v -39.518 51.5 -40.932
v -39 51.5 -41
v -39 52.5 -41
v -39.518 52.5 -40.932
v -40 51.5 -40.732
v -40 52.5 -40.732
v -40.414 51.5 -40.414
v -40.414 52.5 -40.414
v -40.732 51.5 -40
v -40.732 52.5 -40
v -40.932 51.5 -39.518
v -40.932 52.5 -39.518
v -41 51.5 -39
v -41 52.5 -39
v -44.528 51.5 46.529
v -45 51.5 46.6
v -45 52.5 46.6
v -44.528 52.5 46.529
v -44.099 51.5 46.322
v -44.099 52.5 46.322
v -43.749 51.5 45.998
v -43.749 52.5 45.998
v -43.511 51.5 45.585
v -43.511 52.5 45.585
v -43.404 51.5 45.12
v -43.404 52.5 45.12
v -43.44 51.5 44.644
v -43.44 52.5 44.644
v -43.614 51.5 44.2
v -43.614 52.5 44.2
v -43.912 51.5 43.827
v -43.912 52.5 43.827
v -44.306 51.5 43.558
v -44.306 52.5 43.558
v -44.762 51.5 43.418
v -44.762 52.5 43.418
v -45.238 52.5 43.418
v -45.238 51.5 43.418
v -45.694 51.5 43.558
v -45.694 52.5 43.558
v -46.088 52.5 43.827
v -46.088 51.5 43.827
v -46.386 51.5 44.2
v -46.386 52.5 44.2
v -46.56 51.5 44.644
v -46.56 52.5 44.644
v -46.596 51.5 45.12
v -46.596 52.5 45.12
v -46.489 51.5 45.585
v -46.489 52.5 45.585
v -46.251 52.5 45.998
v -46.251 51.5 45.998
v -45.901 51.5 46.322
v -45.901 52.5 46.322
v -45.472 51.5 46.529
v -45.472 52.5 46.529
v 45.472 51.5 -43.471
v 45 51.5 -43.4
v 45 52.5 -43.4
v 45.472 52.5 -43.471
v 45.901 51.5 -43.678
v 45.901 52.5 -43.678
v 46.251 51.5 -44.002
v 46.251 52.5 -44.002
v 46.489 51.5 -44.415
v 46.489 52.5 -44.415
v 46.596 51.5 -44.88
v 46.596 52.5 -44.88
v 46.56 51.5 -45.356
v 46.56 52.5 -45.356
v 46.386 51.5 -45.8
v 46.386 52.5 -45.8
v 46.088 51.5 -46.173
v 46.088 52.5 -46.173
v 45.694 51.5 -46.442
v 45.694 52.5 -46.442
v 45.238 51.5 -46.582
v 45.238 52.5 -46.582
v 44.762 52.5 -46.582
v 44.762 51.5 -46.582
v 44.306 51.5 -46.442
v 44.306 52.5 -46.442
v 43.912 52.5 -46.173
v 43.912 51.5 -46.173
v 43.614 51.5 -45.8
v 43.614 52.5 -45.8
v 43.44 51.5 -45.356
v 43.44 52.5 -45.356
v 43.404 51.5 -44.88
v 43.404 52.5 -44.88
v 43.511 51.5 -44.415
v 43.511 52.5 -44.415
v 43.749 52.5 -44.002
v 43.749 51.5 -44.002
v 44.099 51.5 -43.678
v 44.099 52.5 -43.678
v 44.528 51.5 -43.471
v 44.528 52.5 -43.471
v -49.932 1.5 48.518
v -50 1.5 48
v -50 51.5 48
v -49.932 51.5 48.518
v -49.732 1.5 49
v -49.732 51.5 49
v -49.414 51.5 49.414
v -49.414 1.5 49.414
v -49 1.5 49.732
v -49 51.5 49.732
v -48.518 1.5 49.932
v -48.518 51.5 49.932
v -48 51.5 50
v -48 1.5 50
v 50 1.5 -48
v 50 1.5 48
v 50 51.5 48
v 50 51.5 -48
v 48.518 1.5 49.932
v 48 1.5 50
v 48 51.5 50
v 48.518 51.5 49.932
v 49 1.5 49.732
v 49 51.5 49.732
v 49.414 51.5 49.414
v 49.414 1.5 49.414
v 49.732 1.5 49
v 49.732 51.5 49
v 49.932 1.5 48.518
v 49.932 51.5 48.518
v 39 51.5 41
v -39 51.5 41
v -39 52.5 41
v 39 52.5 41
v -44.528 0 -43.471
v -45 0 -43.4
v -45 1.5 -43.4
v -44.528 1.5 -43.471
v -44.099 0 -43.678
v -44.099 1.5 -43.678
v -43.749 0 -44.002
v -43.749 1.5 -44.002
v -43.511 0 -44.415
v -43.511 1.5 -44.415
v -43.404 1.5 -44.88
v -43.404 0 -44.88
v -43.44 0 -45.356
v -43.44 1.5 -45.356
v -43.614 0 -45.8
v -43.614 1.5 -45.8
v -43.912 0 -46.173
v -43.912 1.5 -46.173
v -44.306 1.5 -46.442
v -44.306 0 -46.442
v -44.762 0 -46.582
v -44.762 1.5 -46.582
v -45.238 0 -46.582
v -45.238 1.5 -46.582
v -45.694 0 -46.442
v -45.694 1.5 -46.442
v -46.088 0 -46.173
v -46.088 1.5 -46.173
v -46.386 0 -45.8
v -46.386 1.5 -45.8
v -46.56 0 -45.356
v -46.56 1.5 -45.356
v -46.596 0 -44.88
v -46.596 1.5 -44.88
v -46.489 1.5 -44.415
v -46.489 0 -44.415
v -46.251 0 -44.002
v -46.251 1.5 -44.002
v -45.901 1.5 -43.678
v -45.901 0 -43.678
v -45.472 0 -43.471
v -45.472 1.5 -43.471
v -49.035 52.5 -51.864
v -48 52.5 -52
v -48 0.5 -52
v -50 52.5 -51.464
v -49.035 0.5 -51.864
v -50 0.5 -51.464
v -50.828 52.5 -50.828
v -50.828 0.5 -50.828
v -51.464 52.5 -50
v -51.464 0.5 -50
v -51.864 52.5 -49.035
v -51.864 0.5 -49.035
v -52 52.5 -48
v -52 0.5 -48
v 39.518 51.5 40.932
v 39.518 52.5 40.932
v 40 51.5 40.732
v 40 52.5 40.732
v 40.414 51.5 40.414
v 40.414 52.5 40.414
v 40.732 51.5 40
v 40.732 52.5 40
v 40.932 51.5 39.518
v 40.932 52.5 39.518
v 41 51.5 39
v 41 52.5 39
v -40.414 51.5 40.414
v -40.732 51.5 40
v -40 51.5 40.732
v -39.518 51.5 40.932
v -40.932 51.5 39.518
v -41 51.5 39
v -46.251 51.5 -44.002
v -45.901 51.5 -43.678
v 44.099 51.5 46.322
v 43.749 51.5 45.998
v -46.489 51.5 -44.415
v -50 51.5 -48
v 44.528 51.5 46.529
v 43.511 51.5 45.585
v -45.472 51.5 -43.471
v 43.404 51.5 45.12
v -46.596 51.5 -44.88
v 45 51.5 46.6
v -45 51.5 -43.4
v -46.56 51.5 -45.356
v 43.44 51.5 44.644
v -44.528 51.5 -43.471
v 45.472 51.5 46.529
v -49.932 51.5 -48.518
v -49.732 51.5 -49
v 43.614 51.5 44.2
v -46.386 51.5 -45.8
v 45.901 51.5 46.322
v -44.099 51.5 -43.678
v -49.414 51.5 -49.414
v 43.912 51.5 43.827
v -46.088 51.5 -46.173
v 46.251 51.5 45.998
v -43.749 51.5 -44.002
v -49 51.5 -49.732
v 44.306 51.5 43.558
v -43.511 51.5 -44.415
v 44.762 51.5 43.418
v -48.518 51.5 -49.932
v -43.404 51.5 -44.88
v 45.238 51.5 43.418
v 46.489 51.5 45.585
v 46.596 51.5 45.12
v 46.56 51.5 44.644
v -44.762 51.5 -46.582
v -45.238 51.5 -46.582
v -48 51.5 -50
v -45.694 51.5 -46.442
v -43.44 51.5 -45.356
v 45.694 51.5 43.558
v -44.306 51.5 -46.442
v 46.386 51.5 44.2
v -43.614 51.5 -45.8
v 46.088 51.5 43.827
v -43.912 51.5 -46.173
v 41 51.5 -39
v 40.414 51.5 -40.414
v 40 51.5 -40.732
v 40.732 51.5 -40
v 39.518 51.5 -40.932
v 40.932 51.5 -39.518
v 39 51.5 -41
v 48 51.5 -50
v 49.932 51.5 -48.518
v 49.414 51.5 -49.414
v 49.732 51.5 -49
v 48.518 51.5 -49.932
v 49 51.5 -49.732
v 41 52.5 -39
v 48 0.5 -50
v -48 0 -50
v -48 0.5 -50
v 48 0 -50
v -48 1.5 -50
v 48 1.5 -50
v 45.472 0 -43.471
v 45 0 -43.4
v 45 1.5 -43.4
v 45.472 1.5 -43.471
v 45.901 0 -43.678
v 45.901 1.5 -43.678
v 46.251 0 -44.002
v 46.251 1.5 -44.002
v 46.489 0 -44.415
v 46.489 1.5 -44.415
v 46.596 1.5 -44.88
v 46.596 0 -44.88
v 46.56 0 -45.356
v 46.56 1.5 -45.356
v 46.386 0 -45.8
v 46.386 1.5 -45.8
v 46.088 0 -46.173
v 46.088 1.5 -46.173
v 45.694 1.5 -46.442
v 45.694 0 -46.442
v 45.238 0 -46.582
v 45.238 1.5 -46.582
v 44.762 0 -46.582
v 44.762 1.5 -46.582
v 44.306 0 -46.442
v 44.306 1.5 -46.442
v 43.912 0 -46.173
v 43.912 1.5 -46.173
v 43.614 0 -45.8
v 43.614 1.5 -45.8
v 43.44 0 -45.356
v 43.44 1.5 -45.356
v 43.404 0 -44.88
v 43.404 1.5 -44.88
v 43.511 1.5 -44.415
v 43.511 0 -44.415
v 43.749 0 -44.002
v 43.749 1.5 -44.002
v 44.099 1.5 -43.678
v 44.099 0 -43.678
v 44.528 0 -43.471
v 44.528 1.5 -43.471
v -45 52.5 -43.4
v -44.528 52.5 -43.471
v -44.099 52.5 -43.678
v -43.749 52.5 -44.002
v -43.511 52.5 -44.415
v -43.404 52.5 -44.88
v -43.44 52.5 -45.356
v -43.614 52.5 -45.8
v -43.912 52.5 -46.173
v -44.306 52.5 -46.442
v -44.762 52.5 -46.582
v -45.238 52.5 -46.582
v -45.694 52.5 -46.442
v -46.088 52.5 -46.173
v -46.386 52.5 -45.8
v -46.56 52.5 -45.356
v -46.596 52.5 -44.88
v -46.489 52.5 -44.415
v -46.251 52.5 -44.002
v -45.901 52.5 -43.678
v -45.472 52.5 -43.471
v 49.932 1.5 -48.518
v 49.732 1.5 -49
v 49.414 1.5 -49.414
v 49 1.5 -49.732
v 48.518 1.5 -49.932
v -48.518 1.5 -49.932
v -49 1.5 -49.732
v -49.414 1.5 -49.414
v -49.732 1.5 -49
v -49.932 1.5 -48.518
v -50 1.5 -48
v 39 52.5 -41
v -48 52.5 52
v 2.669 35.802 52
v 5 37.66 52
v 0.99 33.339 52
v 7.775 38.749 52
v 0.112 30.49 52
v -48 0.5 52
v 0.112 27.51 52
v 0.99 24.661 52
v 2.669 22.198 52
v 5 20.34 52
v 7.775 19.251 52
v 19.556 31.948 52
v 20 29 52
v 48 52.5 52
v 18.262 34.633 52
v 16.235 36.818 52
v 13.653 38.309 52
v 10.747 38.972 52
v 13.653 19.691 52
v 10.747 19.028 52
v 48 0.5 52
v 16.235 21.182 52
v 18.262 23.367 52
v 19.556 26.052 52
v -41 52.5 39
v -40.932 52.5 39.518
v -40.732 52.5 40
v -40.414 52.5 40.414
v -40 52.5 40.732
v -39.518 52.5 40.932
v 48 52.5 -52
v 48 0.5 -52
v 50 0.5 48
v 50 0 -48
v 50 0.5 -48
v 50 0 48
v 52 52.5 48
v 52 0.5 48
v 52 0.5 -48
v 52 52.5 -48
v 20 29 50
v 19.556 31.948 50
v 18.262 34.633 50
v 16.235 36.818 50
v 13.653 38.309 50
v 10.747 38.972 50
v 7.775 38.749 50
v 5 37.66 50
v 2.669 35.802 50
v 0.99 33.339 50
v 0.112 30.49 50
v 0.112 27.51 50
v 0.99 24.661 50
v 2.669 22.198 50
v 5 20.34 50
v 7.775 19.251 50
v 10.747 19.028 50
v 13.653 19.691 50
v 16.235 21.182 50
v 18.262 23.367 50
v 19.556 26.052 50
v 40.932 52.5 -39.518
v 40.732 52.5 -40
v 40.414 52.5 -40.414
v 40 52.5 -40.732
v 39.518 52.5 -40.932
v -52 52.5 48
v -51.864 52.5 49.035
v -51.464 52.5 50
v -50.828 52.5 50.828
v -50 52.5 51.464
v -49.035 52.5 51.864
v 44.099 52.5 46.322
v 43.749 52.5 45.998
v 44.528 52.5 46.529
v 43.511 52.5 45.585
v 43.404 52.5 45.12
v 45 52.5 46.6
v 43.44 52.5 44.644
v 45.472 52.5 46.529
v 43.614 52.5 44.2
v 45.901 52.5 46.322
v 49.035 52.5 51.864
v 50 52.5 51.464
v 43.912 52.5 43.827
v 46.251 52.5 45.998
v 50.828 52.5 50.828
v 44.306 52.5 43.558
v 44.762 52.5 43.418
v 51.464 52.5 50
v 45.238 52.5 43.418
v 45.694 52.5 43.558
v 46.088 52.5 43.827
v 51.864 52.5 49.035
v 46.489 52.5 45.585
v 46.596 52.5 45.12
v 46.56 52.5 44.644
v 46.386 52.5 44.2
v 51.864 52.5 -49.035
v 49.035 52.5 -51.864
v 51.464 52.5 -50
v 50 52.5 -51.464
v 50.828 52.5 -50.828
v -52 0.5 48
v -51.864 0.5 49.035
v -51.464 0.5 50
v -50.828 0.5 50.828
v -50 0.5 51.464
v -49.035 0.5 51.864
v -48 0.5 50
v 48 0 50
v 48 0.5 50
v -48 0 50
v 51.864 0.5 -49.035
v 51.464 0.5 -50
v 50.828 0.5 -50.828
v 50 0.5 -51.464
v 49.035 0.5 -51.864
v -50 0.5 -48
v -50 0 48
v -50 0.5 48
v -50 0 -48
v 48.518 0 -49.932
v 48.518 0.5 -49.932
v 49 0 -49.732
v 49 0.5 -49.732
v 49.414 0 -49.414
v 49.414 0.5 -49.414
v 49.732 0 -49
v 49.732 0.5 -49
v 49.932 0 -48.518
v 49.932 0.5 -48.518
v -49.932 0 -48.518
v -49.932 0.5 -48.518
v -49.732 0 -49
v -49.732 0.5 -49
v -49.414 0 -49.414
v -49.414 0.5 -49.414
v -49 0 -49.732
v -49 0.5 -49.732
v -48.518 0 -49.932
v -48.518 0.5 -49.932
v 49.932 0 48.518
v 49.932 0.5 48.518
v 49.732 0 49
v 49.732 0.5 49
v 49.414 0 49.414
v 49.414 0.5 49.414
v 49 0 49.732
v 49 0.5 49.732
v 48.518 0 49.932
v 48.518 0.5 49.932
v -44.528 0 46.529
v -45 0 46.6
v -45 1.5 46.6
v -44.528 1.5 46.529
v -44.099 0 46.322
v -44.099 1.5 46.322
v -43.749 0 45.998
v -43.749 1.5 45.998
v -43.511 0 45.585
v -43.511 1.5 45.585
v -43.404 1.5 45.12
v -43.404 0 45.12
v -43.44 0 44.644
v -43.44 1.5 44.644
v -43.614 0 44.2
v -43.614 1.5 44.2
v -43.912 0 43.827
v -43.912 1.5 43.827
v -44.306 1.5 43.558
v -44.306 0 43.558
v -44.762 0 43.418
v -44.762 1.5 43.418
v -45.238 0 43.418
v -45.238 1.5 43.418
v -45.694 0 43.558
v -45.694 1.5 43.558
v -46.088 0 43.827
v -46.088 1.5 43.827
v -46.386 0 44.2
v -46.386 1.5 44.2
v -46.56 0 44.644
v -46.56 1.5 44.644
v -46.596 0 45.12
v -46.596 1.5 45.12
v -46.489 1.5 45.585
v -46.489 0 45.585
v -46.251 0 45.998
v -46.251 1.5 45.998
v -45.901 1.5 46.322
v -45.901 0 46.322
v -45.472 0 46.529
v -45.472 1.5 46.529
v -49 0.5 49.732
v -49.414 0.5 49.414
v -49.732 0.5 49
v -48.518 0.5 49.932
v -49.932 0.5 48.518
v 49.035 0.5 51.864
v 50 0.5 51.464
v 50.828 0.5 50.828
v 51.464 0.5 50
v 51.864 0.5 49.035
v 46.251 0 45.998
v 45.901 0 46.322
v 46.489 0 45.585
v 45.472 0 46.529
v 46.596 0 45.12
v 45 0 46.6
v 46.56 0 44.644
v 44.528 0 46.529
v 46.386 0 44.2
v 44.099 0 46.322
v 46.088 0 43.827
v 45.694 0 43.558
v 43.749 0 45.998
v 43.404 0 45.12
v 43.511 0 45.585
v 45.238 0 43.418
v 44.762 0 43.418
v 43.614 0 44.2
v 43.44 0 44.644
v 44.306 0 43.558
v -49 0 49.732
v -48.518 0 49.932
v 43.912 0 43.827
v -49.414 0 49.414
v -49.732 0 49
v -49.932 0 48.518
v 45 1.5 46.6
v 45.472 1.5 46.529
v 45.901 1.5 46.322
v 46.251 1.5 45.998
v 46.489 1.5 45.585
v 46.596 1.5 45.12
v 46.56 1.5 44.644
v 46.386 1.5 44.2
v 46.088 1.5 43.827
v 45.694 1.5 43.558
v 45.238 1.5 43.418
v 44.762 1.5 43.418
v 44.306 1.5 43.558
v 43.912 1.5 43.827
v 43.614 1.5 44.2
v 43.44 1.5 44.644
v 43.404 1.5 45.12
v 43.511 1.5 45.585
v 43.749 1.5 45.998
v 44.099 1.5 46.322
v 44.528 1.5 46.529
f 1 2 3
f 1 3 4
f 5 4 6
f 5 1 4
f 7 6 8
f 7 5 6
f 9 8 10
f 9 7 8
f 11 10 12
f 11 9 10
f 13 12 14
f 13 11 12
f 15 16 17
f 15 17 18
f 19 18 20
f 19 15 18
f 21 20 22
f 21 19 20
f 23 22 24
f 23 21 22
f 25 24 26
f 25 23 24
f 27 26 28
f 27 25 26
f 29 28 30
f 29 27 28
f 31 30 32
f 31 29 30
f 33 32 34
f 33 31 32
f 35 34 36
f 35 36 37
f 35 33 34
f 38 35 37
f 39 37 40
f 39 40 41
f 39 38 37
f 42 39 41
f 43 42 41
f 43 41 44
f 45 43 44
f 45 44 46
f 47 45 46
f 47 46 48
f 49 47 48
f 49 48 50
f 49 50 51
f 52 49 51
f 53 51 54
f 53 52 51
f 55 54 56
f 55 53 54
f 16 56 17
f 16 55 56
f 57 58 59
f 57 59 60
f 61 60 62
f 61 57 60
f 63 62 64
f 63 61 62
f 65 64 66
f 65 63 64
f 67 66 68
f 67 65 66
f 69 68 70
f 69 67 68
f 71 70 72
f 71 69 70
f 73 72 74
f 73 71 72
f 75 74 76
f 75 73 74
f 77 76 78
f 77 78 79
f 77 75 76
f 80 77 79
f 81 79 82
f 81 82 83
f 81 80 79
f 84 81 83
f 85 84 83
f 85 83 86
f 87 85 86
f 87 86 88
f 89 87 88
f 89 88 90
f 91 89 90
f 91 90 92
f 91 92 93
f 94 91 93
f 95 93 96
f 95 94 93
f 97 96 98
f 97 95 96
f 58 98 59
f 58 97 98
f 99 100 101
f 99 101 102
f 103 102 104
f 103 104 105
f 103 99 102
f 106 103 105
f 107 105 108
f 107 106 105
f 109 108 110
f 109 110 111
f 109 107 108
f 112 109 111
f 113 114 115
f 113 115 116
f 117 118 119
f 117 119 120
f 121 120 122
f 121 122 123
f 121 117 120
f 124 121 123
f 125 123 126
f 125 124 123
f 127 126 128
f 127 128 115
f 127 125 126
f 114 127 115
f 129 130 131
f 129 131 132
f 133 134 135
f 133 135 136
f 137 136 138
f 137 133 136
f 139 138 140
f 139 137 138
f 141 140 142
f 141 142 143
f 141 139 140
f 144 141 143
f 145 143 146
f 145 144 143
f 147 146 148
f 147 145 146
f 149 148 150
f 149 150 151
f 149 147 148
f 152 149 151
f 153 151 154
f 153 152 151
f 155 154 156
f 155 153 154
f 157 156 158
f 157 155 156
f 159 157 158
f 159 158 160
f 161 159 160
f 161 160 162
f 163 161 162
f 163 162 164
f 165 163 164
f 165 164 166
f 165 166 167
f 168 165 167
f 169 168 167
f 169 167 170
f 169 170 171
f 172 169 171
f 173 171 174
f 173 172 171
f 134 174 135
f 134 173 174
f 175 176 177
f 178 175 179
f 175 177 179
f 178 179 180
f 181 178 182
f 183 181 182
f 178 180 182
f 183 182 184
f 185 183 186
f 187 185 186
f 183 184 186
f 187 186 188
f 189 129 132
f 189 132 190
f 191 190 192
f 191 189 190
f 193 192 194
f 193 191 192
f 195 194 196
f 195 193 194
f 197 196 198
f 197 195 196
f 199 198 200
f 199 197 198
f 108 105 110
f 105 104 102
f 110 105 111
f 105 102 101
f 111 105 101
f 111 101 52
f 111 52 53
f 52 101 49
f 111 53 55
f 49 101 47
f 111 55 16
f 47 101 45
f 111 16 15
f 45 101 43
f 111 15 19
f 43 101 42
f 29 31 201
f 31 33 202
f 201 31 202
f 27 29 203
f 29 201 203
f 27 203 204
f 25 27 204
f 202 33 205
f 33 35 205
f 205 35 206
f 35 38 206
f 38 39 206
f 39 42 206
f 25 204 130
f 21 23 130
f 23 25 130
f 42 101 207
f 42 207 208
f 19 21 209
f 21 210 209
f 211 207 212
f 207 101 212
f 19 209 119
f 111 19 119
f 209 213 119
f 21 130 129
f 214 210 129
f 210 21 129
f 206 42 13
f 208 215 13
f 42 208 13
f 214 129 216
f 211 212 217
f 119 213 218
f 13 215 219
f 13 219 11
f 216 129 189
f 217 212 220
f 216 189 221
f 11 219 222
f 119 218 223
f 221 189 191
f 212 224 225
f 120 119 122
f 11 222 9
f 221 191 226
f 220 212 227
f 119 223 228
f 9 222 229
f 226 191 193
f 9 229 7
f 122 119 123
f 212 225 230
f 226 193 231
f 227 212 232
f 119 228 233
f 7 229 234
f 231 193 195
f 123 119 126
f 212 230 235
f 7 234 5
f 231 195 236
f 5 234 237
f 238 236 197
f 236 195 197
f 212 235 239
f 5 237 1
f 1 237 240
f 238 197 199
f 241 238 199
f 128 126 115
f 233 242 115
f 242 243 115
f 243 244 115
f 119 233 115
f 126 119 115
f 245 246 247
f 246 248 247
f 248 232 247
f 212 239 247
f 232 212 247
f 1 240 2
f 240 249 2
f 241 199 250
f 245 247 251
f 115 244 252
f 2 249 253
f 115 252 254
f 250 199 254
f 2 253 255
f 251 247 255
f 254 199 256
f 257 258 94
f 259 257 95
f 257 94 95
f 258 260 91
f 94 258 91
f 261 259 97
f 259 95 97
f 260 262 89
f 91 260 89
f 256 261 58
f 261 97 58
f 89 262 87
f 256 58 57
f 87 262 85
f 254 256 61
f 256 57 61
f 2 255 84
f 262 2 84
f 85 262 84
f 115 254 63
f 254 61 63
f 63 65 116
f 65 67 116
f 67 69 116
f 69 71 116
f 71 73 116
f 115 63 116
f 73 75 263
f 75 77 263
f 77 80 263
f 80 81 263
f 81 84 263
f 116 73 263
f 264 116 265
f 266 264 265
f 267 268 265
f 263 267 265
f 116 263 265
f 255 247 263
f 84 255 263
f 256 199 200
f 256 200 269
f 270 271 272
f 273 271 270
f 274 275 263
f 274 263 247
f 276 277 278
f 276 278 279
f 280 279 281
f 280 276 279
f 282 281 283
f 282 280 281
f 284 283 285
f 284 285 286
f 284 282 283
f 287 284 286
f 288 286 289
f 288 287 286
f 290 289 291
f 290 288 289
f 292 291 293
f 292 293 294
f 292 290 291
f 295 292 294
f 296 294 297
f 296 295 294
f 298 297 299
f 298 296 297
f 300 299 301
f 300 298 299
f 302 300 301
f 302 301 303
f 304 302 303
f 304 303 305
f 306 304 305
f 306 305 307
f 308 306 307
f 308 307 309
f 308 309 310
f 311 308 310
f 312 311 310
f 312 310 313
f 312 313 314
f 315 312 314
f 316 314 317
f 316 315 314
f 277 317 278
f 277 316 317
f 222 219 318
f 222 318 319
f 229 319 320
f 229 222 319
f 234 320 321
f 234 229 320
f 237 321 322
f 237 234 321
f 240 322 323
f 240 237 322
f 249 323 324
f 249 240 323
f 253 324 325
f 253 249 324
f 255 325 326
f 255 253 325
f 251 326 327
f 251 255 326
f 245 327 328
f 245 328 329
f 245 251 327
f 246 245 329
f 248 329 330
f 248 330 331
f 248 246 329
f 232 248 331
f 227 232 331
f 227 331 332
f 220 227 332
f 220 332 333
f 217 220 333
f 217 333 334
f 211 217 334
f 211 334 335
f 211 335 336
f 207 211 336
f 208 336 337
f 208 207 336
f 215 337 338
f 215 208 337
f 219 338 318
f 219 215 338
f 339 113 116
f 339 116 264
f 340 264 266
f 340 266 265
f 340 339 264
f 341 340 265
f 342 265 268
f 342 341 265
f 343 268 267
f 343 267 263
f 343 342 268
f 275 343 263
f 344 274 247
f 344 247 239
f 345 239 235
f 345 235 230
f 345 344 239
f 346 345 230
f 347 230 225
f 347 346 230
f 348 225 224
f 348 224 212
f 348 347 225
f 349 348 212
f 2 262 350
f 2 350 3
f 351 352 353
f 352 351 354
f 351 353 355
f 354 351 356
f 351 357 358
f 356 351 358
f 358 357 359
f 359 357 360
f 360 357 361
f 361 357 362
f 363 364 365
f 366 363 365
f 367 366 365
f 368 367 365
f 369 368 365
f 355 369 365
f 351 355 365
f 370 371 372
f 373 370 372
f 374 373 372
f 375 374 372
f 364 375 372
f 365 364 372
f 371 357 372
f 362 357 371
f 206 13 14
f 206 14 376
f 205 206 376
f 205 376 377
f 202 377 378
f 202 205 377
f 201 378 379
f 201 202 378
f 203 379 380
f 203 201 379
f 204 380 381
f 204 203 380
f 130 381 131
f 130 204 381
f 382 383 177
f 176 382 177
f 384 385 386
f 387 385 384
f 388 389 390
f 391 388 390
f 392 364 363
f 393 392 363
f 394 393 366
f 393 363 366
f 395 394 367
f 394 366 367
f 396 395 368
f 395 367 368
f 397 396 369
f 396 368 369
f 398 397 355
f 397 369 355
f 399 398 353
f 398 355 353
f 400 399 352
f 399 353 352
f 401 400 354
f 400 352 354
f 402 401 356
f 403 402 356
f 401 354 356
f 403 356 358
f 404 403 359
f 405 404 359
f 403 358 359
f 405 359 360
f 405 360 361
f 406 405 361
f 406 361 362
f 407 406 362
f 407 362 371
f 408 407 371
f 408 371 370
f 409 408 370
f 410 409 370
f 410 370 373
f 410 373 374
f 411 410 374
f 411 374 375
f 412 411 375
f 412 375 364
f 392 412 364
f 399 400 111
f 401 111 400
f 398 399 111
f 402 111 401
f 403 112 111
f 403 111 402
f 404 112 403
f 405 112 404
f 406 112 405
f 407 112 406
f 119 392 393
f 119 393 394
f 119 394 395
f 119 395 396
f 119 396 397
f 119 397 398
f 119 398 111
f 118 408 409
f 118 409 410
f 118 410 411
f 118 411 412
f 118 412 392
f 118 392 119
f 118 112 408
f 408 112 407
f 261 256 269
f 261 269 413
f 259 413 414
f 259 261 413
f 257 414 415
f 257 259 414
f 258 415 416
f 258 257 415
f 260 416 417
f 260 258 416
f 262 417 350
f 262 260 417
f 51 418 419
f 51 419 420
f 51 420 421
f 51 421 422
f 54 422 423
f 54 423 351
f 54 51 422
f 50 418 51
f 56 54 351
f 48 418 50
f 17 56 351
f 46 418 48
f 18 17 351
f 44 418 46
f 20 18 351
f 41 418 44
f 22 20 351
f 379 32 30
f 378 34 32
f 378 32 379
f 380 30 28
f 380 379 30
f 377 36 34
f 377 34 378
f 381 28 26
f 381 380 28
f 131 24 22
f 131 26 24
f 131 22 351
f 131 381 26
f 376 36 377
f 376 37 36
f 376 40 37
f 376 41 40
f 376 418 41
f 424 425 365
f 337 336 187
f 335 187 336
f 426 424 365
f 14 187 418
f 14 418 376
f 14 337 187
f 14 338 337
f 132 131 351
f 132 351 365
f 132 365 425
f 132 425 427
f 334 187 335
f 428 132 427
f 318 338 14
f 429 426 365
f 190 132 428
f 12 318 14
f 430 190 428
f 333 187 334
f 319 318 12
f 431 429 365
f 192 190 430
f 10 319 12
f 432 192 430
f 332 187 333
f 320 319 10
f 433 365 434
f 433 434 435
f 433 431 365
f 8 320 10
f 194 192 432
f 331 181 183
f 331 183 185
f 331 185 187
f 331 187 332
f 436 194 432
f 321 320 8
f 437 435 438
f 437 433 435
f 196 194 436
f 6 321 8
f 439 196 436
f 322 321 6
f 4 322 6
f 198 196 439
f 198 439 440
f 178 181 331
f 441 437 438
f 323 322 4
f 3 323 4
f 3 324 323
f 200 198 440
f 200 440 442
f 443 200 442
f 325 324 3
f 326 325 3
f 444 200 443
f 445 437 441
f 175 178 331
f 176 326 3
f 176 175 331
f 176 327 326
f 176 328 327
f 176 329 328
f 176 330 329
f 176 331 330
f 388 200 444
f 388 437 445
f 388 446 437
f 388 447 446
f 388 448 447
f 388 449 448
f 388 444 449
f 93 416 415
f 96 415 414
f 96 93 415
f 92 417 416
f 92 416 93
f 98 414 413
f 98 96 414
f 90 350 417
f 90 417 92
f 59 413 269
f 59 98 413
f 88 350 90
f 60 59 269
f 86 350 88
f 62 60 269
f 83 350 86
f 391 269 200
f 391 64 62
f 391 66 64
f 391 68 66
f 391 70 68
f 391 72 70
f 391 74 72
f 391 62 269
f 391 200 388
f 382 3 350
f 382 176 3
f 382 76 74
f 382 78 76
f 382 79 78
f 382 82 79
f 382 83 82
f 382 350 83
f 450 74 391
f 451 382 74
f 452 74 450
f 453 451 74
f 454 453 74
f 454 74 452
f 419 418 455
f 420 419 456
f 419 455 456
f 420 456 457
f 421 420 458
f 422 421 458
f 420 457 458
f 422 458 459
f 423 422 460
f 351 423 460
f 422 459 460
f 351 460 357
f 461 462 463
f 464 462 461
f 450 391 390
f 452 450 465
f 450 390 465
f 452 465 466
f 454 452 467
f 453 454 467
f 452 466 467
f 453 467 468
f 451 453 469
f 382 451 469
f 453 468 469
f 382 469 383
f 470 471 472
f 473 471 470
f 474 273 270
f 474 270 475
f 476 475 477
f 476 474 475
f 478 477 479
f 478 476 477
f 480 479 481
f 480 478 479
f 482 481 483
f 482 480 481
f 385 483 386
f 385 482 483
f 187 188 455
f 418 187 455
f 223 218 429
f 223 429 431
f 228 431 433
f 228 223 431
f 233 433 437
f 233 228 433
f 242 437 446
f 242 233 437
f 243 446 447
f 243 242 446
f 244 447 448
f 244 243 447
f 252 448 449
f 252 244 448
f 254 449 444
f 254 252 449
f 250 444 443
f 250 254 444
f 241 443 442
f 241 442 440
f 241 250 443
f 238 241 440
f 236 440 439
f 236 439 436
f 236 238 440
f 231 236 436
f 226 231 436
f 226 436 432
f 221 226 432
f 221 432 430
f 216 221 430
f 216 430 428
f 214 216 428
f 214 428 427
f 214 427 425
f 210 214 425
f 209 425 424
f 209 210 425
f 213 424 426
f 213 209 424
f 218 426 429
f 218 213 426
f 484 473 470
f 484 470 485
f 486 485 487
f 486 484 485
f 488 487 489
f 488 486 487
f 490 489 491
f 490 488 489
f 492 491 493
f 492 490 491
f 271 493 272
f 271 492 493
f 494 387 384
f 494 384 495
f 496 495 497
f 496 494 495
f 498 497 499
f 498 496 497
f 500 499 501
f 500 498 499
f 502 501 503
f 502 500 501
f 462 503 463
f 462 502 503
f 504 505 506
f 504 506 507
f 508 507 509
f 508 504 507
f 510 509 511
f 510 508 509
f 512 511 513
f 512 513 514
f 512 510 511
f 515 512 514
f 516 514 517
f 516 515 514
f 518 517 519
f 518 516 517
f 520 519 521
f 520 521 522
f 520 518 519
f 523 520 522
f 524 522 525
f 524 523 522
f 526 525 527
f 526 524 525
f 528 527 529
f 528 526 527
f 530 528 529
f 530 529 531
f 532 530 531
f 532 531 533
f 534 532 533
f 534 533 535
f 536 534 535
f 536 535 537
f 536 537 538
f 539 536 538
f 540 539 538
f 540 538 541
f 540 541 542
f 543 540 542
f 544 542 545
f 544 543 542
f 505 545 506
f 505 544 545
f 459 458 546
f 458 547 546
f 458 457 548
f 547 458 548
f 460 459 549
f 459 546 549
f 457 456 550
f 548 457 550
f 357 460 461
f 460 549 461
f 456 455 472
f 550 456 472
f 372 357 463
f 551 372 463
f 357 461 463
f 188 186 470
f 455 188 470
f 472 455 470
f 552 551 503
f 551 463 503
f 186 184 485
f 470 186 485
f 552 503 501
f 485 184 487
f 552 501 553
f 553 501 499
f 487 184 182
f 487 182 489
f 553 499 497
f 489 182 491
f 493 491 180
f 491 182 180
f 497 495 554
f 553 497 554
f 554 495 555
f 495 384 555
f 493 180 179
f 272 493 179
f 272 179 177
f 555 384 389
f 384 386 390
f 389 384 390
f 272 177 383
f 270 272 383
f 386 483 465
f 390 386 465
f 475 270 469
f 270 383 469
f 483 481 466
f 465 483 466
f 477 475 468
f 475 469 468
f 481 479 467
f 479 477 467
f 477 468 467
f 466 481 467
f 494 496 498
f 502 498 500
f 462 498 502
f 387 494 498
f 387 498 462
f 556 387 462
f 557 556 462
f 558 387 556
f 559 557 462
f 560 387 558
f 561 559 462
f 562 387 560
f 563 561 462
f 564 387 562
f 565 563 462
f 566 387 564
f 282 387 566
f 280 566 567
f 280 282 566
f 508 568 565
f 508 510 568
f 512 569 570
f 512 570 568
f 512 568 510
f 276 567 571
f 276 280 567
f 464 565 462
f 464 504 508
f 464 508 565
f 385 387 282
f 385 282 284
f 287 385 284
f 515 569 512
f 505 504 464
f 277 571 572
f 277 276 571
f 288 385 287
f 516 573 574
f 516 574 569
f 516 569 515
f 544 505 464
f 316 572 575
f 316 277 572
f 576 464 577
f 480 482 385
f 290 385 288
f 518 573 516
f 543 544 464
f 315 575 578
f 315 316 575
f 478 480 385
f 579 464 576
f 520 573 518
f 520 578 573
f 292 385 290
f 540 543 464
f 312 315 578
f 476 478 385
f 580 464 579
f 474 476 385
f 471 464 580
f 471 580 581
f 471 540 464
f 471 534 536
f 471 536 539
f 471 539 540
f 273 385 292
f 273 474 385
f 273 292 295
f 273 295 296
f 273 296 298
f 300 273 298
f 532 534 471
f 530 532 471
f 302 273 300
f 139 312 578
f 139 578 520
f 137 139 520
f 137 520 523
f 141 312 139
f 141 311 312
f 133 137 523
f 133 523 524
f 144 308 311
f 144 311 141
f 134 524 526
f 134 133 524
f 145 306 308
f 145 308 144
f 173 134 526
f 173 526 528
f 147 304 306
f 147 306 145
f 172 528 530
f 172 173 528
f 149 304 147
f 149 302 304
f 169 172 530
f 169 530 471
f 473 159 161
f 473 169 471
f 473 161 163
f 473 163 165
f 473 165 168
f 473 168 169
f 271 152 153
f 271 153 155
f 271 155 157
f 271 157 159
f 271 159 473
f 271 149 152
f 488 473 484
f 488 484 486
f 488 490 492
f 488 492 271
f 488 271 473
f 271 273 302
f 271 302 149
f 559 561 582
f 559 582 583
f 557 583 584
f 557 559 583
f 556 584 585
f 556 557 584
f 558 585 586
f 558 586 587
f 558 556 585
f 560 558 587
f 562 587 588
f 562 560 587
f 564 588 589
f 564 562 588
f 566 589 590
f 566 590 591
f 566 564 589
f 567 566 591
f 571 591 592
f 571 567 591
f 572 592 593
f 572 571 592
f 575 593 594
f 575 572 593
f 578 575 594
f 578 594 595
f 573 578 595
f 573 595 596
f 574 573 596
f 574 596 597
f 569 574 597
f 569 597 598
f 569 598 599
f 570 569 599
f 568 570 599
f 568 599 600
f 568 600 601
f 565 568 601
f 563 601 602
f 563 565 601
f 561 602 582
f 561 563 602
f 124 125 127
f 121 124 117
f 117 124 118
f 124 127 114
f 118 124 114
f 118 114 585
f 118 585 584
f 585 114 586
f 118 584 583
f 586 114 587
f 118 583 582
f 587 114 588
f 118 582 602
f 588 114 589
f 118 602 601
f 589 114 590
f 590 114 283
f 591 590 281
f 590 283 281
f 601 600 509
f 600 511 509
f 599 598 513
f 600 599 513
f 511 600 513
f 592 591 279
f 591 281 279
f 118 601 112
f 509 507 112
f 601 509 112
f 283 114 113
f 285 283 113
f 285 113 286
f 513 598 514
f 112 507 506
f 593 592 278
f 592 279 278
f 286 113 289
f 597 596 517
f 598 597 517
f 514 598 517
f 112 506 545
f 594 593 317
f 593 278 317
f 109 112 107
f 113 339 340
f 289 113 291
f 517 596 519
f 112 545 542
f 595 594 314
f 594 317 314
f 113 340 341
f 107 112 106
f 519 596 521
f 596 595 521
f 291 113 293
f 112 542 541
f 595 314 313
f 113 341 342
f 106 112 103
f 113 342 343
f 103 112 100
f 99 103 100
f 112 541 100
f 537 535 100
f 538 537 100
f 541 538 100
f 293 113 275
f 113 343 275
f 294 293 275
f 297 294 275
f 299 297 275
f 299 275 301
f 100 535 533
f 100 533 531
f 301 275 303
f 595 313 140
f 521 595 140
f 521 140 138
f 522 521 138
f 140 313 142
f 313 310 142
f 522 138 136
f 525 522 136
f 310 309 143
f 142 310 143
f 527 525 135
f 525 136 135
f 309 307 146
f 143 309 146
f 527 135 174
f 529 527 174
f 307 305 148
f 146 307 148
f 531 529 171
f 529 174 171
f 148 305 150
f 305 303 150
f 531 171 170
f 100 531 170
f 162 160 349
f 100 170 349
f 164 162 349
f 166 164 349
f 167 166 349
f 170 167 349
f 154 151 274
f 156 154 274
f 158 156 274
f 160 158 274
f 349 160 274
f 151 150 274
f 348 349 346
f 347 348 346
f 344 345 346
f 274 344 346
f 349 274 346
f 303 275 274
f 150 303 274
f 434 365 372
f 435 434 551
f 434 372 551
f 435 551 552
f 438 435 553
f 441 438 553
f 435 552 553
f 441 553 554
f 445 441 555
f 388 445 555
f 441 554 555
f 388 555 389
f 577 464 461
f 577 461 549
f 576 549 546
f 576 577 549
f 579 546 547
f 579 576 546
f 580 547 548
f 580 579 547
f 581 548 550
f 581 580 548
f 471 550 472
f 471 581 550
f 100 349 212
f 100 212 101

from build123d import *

# Parameters (mm, degrees)
SKETCH1_R            = 1.6
BOSS_EXTRUDE1_DEPTH  = 1.5
BOSS_EXTRUDE10_DEPTH = 50
SKETCH5_R            = 10
CUT_EXTRUDE1_DEPTH   = 10
SKETCH6_R            = 1.6
BOSS_EXTRUDE11_DEPTH = 1
BOSS_EXTRUDE12_START = -1
BOSS_EXTRUDE12_DEPTH = 1


with BuildPart() as part:
    # Sketch1 → Boss-Extrude1 (new body)
    with BuildSketch(Plane(origin=(0, 0, 0), x_dir=(1, 0, 0), z_dir=(0, 1, 0))):
        with BuildLine():
            Line((48, -50), (-48, -50))
            ThreePointArc((-48, -50), (-49.414213562, -49.414213562), (-50, -48))
            Line((-50, -48), (-50, 48))
            ThreePointArc((-50, 48), (-49.414213562, 49.414213562), (-48, 50))
            Line((-48, 50), (48, 50))
            ThreePointArc((48, 50), (49.414213562, 49.414213562), (50, 48))
            Line((50, 48), (50, -48))
            ThreePointArc((50, -48), (49.414213562, -49.414213562), (48, -50))
        make_face()
        with Locations((-45, 45)):
            Circle(SKETCH1_R, mode=Mode.SUBTRACT)
        with Locations((45, 45)):
            Circle(SKETCH1_R, mode=Mode.SUBTRACT)
        with Locations((45, -45)):
            Circle(SKETCH1_R, mode=Mode.SUBTRACT)
        with Locations((-45, -45)):
            Circle(SKETCH1_R, mode=Mode.SUBTRACT)
    extrude(amount=BOSS_EXTRUDE1_DEPTH)



with BuildPart() as body_2:
    # Sketch2 → Boss-Extrude10 (new body)
    with BuildSketch(Plane(origin=(0, 1.5, 0), x_dir=(1, 0, 0), z_dir=(0, 1, 0))):
        with BuildLine():
            Line((48, 52), (-48, 52))
            ThreePointArc((-48, 52), (-50.828427125, 50.828427125), (-52, 48))
            Line((-52, 48), (-52, -48))
            ThreePointArc((-52, -48), (-50.828427125, -50.828427125), (-48, -52))
            Line((-48, -52), (48, -52))
            ThreePointArc((48, -52), (50.828427125, -50.828427125), (52, -48))
            Line((52, -48), (52, 48))
            ThreePointArc((52, 48), (50.828427125, 50.828427125), (48, 52))
        make_face()
        with BuildLine():
            Line((48, 50), (-48, 50))
            ThreePointArc((-48, 50), (-49.414213562, 49.414213562), (-50, 48))
            Line((-50, 48), (-50, -48))
            ThreePointArc((-50, -48), (-49.414213562, -49.414213562), (-48, -50))
            Line((-48, -50), (48, -50))
            ThreePointArc((48, -50), (49.414213562, -49.414213562), (50, -48))
            Line((50, -48), (50, 48))
            ThreePointArc((50, 48), (49.414213562, 49.414213562), (48, 50))
        make_face(mode=Mode.SUBTRACT)
    extrude(amount=BOSS_EXTRUDE10_DEPTH)

    # Sketch5 → Cut-Extrude1 (cut)
    with BuildSketch(Plane.XY.offset(52)):
        with Locations((10, 29)):
            Circle(SKETCH5_R)
    extrude(amount=-CUT_EXTRUDE1_DEPTH, mode=Mode.SUBTRACT)

    # Sketch6 → Boss-Extrude11 (add)
    with BuildSketch(Plane(origin=(0, 51.5, 0), x_dir=(1, 0, 0), z_dir=(0, 1, 0))):
        with BuildLine():
            Line((48, 52), (-48, 52))
            ThreePointArc((-48, 52), (-50.828427125, 50.828427125), (-52, 48))
            Line((-52, 48), (-52, -48))
            ThreePointArc((-52, -48), (-50.828427125, -50.828427125), (-48, -52))
            Line((-48, -52), (48, -52))
            ThreePointArc((48, -52), (50.828427125, -50.828427125), (52, -48))
            Line((52, -48), (52, 48))
            ThreePointArc((52, 48), (50.828427125, 50.828427125), (48, 52))
        make_face()
        with Locations((-45, 45)):
            Circle(SKETCH6_R, mode=Mode.SUBTRACT)
        with Locations((45, 45)):
            Circle(SKETCH6_R, mode=Mode.SUBTRACT)
        with Locations((45, -45)):
            Circle(SKETCH6_R, mode=Mode.SUBTRACT)
        with Locations((-45, -45)):
            Circle(SKETCH6_R, mode=Mode.SUBTRACT)
        with BuildLine():
            Line((-39, -41), (39, -41))
            ThreePointArc((39, -41), (40.414213562, -40.414213562), (41, -39))
            Line((41, -39), (41, 39))
            ThreePointArc((41, 39), (40.414213562, 40.414213562), (39, 41))
            Line((39, 41), (-39, 41))
            ThreePointArc((-39, 41), (-40.414213562, 40.414213562), (-41, 39))
            Line((-41, 39), (-41, -39))
            ThreePointArc((-41, -39), (-40.414213562, -40.414213562), (-39, -41))
        make_face(mode=Mode.SUBTRACT)
    extrude(amount=BOSS_EXTRUDE11_DEPTH)


with BuildPart() as part_1:
    add(part.part)

    add(body_2.part)  # Boss-Extrude12 merges body 2
    # Sketch2<6> → Boss-Extrude12 (add)
    with BuildSketch(Plane(origin=(0, 1.5, 0), x_dir=(1, 0, 0), z_dir=(0, 1, 0)).offset(BOSS_EXTRUDE12_START)):
        with BuildLine():
            Line((48, 52), (-48, 52))
            ThreePointArc((-48, 52), (-50.828427125, 50.828427125), (-52, 48))
            Line((-52, 48), (-52, -48))
            ThreePointArc((-52, -48), (-50.828427125, -50.828427125), (-48, -52))
            Line((-48, -52), (48, -52))
            ThreePointArc((48, -52), (50.828427125, -50.828427125), (52, -48))
            Line((52, -48), (52, 48))
            ThreePointArc((52, 48), (50.828427125, 50.828427125), (48, 52))
        make_face()
        with BuildLine():
            Line((48, 50), (-48, 50))
            ThreePointArc((-48, 50), (-49.414213562, 49.414213562), (-50, 48))
            Line((-50, 48), (-50, -48))
            ThreePointArc((-50, -48), (-49.414213562, -49.414213562), (-48, -50))
            Line((-48, -50), (48, -50))
            ThreePointArc((48, -50), (49.414213562, -49.414213562), (50, -48))
            Line((50, -48), (50, 48))
            ThreePointArc((50, 48), (49.414213562, 49.414213562), (48, 50))
        make_face(mode=Mode.SUBTRACT)
    extrude(amount=BOSS_EXTRUDE12_DEPTH)


solid = part_1.part
